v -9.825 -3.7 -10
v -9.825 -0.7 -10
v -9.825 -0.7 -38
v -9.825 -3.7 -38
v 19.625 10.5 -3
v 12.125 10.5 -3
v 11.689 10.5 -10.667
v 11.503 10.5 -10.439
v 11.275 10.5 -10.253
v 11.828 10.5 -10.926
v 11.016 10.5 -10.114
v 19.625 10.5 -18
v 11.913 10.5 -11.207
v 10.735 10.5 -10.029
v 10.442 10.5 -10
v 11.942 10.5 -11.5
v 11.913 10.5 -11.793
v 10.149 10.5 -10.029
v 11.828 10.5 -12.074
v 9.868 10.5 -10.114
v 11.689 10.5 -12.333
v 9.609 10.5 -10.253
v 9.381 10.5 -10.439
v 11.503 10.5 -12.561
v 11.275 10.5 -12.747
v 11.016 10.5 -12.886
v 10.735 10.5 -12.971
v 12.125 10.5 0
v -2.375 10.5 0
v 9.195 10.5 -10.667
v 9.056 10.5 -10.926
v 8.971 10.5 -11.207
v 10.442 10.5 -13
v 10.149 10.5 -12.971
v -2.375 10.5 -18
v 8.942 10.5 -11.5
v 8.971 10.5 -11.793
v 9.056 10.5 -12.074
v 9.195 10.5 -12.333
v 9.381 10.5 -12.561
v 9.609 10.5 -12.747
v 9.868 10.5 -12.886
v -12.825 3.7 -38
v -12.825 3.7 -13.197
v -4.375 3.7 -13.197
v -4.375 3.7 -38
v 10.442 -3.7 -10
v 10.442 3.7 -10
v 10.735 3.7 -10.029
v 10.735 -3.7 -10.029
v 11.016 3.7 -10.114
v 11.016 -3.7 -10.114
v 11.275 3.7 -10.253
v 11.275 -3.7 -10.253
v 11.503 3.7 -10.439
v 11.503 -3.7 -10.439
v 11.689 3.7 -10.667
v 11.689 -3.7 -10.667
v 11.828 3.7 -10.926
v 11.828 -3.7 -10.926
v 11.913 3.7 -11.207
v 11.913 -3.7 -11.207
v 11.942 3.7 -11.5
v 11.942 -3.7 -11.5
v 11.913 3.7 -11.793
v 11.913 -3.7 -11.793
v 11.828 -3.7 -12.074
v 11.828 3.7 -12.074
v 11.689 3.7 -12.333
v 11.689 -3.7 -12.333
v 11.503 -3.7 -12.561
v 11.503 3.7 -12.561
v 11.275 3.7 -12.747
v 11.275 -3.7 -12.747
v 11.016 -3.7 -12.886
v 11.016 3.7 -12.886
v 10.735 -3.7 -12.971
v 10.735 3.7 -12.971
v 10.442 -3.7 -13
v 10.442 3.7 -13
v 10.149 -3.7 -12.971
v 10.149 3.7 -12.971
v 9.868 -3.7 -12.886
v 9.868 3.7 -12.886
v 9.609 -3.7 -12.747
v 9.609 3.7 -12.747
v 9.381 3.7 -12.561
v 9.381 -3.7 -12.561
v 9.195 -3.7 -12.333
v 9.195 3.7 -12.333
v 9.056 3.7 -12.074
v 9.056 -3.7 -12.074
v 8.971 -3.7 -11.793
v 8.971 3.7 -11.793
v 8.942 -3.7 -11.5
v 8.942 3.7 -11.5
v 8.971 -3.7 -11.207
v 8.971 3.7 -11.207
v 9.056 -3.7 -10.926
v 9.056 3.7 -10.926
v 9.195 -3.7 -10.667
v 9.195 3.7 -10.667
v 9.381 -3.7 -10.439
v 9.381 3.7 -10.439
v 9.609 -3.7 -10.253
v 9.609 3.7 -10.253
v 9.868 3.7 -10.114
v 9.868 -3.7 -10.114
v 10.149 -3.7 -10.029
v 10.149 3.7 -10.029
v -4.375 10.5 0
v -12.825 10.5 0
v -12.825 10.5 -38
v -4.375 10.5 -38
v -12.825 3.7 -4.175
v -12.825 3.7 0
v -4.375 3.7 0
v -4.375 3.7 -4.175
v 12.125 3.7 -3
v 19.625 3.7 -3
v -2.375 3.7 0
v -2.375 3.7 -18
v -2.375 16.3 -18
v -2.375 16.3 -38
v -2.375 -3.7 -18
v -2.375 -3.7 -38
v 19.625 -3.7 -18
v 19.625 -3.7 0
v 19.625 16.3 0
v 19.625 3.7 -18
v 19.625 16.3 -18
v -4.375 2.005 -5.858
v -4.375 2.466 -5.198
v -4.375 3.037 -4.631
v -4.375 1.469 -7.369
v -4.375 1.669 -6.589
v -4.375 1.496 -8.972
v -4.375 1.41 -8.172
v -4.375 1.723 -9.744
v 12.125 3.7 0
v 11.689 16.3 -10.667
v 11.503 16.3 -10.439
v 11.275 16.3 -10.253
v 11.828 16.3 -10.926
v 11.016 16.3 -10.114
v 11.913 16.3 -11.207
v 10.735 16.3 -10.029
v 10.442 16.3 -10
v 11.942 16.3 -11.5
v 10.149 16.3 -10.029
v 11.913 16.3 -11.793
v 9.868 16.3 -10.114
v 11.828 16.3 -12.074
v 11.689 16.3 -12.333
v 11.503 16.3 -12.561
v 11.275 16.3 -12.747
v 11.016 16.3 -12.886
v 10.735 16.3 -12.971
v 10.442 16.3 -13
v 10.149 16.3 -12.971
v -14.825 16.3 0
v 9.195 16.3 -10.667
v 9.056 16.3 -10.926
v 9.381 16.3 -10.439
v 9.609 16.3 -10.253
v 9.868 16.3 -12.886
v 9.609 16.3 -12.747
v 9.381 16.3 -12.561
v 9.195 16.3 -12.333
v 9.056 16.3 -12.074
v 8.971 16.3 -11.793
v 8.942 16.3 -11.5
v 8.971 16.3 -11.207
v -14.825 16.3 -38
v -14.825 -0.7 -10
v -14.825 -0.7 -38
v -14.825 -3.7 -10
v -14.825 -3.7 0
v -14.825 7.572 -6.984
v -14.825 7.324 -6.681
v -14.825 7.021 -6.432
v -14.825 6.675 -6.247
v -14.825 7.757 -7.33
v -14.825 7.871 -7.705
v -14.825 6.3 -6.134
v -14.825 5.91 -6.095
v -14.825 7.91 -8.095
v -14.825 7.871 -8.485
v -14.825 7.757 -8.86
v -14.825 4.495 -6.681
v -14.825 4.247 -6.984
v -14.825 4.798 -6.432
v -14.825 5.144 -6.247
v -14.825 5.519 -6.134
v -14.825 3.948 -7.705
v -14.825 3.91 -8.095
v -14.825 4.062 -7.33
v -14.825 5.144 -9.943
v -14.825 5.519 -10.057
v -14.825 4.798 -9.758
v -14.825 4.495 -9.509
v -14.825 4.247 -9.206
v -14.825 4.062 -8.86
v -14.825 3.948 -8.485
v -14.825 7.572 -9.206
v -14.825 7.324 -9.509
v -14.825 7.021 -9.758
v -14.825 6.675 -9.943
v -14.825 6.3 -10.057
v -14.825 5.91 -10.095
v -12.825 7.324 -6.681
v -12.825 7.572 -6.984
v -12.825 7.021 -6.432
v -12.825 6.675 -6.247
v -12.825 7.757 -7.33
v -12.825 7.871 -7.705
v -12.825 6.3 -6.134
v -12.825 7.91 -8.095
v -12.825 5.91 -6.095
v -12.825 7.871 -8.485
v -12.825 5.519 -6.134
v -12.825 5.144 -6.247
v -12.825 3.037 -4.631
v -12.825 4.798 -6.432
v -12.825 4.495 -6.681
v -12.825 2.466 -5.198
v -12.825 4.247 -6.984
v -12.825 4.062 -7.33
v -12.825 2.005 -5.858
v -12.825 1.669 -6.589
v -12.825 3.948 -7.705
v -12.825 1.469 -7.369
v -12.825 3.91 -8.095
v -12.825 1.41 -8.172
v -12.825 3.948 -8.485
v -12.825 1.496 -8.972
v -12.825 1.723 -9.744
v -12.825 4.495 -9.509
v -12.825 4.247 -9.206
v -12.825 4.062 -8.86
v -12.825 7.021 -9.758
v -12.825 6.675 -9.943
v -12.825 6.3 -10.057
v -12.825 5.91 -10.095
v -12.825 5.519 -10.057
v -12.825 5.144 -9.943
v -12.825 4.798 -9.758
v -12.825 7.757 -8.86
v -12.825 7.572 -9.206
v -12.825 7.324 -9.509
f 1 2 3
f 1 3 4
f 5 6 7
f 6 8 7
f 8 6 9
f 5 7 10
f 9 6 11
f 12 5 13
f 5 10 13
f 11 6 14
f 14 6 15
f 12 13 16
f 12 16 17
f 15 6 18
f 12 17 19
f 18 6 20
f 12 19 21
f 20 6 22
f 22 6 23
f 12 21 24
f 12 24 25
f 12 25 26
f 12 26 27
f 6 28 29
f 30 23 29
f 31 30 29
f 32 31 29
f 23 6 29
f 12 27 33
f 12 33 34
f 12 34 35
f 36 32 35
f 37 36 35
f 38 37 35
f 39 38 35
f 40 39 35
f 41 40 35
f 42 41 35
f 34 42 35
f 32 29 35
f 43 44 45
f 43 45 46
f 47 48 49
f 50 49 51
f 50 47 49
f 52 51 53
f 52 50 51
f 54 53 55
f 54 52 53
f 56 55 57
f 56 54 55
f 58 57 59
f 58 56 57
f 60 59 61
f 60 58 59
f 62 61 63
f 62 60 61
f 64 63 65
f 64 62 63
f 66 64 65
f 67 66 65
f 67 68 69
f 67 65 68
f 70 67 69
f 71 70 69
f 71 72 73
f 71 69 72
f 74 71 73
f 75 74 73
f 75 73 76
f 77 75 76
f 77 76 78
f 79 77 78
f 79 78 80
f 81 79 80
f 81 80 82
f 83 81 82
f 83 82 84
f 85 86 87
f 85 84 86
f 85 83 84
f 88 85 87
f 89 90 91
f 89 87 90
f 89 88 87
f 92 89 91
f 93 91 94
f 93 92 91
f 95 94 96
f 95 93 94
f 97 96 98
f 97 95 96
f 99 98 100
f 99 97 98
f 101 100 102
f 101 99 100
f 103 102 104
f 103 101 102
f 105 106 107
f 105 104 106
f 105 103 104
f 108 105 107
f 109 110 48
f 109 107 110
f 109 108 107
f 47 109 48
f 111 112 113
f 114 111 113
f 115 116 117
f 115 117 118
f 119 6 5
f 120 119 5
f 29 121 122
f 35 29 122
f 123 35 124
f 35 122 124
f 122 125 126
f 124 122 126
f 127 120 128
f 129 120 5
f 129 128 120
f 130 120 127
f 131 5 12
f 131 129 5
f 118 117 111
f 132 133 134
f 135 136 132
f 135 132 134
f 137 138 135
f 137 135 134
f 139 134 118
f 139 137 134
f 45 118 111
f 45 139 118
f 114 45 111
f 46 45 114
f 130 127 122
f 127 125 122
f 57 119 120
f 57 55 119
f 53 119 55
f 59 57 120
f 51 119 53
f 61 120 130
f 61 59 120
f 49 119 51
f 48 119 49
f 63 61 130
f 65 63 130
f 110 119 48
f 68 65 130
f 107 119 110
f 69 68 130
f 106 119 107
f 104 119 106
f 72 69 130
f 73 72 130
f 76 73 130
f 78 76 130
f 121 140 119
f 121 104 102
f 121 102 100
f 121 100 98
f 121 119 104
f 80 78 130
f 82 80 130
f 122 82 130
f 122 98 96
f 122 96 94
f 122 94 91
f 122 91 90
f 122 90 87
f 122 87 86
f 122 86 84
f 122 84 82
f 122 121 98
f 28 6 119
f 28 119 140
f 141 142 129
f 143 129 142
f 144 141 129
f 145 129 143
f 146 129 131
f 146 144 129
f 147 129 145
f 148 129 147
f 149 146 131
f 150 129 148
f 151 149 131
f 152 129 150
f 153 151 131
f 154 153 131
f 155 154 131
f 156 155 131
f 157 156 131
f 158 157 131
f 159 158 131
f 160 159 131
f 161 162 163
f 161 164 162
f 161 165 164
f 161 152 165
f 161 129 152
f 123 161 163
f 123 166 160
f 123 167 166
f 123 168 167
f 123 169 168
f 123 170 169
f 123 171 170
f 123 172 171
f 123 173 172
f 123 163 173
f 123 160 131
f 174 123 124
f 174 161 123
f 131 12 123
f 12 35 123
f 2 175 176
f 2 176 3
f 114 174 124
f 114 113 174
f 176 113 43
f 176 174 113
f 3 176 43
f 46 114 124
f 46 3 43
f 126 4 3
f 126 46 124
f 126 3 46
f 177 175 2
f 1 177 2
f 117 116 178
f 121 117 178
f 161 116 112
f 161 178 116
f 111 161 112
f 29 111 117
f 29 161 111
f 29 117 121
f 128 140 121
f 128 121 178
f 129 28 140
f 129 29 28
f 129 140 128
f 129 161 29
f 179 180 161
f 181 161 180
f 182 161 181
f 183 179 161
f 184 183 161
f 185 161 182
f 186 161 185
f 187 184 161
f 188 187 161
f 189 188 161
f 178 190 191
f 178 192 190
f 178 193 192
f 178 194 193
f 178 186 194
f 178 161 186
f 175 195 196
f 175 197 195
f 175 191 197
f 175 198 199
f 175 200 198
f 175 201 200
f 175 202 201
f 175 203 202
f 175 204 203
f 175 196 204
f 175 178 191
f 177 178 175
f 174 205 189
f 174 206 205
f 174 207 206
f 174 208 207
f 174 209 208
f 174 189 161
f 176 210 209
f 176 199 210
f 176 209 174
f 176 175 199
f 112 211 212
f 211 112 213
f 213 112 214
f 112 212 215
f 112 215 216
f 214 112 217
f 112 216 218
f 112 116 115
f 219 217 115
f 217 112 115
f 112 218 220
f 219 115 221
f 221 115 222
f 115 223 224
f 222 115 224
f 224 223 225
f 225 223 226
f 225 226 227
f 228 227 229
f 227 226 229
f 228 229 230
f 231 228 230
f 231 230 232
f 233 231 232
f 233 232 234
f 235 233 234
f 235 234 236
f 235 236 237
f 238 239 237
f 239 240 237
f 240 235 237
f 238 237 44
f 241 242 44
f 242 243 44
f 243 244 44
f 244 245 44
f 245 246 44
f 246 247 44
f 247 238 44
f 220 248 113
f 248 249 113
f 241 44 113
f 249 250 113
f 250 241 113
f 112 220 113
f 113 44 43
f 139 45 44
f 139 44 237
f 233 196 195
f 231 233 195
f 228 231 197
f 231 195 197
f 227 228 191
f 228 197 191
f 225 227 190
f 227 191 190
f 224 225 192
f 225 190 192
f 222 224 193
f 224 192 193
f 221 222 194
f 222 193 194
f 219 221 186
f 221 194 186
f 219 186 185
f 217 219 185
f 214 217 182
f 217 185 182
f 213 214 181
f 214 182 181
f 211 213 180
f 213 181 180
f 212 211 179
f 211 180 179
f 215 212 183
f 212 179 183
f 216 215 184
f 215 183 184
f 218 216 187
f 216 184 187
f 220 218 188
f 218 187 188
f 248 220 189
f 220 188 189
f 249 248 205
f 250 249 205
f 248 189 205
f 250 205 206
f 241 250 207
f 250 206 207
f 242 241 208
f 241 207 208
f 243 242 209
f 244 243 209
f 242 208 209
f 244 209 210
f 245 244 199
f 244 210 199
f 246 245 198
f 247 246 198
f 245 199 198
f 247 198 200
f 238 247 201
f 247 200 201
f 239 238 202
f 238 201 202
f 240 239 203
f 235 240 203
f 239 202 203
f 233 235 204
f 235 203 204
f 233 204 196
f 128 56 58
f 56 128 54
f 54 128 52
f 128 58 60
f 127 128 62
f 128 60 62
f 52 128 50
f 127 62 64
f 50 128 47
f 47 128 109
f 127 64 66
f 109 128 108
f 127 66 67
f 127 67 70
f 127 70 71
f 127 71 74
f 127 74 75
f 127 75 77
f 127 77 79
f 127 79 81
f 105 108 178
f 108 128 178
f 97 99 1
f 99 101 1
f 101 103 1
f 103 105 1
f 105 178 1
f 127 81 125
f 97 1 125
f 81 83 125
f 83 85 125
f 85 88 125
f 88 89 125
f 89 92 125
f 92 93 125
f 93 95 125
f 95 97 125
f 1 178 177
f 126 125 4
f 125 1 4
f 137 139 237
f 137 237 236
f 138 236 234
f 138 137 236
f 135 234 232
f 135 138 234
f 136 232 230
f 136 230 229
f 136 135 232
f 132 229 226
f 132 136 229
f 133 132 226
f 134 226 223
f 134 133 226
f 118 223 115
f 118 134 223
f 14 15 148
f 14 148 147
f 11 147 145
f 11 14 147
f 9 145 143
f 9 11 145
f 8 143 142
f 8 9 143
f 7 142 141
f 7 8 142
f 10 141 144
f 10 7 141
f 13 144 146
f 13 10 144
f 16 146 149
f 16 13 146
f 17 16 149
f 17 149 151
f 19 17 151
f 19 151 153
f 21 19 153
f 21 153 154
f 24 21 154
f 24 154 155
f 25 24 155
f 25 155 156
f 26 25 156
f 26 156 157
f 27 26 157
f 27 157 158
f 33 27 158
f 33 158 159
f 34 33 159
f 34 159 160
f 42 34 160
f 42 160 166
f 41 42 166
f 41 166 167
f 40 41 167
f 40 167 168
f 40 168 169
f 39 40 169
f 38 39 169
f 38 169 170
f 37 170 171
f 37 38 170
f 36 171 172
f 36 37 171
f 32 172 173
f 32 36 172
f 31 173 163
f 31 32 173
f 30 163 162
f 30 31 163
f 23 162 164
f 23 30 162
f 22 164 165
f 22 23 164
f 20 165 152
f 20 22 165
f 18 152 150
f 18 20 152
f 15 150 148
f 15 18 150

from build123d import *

# Parameters (mm, degrees)
SKETCH1_W             = 19
SKETCH1_H             = 7.4
BOSS_EXTRUDE1_DEPTH   = 18
SKETCH1_H_2           = 5.8
BOSS_EXTRUDE1_2_DEPTH = 18
SKETCH1_6_W           = 12.45
SKETCH1_6_H           = 5.8
BOSS_EXTRUDE6_DEPTH   = 38
BOSS_EXTRUDE7_DEPTH   = 10
SKETCH4_W             = 18
SKETCH4_H             = 7.4
SKETCH4_H_2           = 5.8
BOSS_EXTRUDE8_DEPTH   = 3
CUT_EXTRUDE1_START    = -7.4
SKETCH6_R             = 1.5
CUT_EXTRUDE1_DEPTH    = 20
BOSS_EXTRUDE10_REACH  = 46.586
SKETCH7_W             = 2
SKETCH7_H             = 38
BOSS_EXTRUDE11_REACH  = 47.064
SKETCH8_W             = 7.5
SKETCH8_H             = 3
SKETCH9_R             = 2
CUT_EXTRUDE2_DEPTH    = 2
CUT_EXTRUDE3_START    = -10.45
CUT_EXTRUDE3_DEPTH    = 8.45


# Read off the part's stored shape, not the designer's step: Cut-Extrude3
with BuildPart() as part:
    # Sketch1 → Boss-Extrude1 (new body)
    with BuildSketch(Plane.XY):
        with Locations((7.125, 0)):
            Rectangle(SKETCH1_W, SKETCH1_H)
    extrude(amount=-BOSS_EXTRUDE1_DEPTH)



with BuildPart() as body_2:
    # Sketch1 → Boss-Extrude1 2 (new body)
    with BuildSketch(Plane.XY):
        with Locations((7.125, 13.4)):
            Rectangle(SKETCH1_W, SKETCH1_H_2)
    extrude(amount=-BOSS_EXTRUDE1_2_DEPTH)


with BuildPart() as part_1:
    add(part.part)

    add(body_2.part)  # Boss-Extrude6 merges body 2
    # Sketch1<6> → Boss-Extrude6 (add)
    with BuildSketch(Plane.XY):
        Polygon((-14.825, 3.7), (-14.825, -0.7), (-9.825, -0.7), (-9.825, -3.7), (-2.375, -3.7), (-2.375, 3.7), align=None)
        with Locations((-8.6, 13.4)):
            Rectangle(SKETCH1_6_W, SKETCH1_6_H)
    extrude(amount=-BOSS_EXTRUDE6_DEPTH)

    # Sketch1<7> → Boss-Extrude7 (add)
    with BuildSketch(Plane.XY):
        Polygon((-14.825, -0.7), (-14.825, -2), (-14.825, -3.7), (-9.825, -3.7), (-9.825, -0.7), align=None)
    extrude(amount=-BOSS_EXTRUDE7_DEPTH)

    # Sketch4 → Boss-Extrude8 (add)
    with BuildSketch(Plane(origin=(16.625, 0, 0), x_dir=(0, 0, -1), z_dir=(1, 0, 0))):
        with Locations((9, 0)):
            Rectangle(SKETCH4_W, SKETCH4_H)
        with Locations((9, 13.4)):
            Rectangle(SKETCH4_W, SKETCH4_H_2)
    extrude(amount=BOSS_EXTRUDE8_DEPTH)

    # Sketch6 → Cut-Extrude1 (cut)
    with BuildSketch(Plane(origin=(0, 3.7, 0), x_dir=(1, 0, 0), z_dir=(0, 1, 0)).offset(CUT_EXTRUDE1_START)):
        with Locations(Location((10.44201924, 11.5, 0), (0, 0, 270))):
            Circle(SKETCH6_R)
    extrude(amount=CUT_EXTRUDE1_DEPTH, mode=Mode.SUBTRACT)

    # Sketch7 → Boss-Extrude10 (add, up to next)
    with BuildSketch(Plane(origin=(0, 3.7, 0), x_dir=(1, 0, 0), z_dir=(0, 1, 0)), mode=Mode.PRIVATE) as boss_extrude10_sk1:
        with Locations((-3.375, 19)):
            Rectangle(SKETCH7_W, SKETCH7_H)
    boss_extrude10_tool1 = extrude(boss_extrude10_sk1.sketch, amount=BOSS_EXTRUDE10_REACH, mode=Mode.PRIVATE) - part_1.part
    # Sketch7 → Boss-Extrude10 (add, up to next)
    with BuildSketch(Plane(origin=(0, 3.7, 0), x_dir=(1, 0, 0), z_dir=(0, 1, 0)), mode=Mode.PRIVATE) as boss_extrude10_sk2:
        with Locations((-13.825, 19)):
            Rectangle(SKETCH7_W, SKETCH7_H)
    boss_extrude10_tool2 = extrude(boss_extrude10_sk2.sketch, amount=BOSS_EXTRUDE10_REACH, mode=Mode.PRIVATE) - part_1.part
    add(boss_extrude10_tool1.solids().sort_by_distance((-3.375, 3.7, -19))[0])
    add(boss_extrude10_tool2.solids().sort_by_distance((-13.825, 3.7, -19))[0])

    # Sketch8 → Boss-Extrude11 (add, up to next)
    with BuildSketch(Plane.XZ.offset(-10.5), mode=Mode.PRIVATE) as boss_extrude11_sk1:
        with Locations((15.875, -1.5)):
            Rectangle(SKETCH8_W, SKETCH8_H)
    boss_extrude11_tool1 = extrude(boss_extrude11_sk1.sketch, amount=BOSS_EXTRUDE11_REACH, mode=Mode.PRIVATE) - part_1.part
    add(boss_extrude11_tool1.solids().sort_by_distance((15.875, 10.5, -1.5))[0])

    # Sketch9 → Cut-Extrude2 (cut)
    with BuildSketch(Plane.ZY.offset(14.825)):
        with Locations(Location((-8.095100141, 5.909535031, 0), (0, 0, 270))):
            Circle(SKETCH9_R)
    extrude(amount=-CUT_EXTRUDE2_DEPTH, mode=Mode.SUBTRACT)

    # Cut-Extrude3 outline → Cut-Extrude3 (cut)
    with BuildSketch(Plane.ZY.offset(14.825).offset(CUT_EXTRUDE3_START)):
        with BuildLine():
            Line((-4.174901811, 3.7), (-13.196516677, 3.7))
            Line((-13.196516677, 3.7), (-9.744129164, 1.722566762))
            ThreePointArc((-9.744129164, 1.722566762), (-6.589406594, 1.668911616), (-4.174901811, 3.7))
        make_face()
    extrude(amount=CUT_EXTRUDE3_DEPTH, mode=Mode.SUBTRACT)


solid = part_1.part
